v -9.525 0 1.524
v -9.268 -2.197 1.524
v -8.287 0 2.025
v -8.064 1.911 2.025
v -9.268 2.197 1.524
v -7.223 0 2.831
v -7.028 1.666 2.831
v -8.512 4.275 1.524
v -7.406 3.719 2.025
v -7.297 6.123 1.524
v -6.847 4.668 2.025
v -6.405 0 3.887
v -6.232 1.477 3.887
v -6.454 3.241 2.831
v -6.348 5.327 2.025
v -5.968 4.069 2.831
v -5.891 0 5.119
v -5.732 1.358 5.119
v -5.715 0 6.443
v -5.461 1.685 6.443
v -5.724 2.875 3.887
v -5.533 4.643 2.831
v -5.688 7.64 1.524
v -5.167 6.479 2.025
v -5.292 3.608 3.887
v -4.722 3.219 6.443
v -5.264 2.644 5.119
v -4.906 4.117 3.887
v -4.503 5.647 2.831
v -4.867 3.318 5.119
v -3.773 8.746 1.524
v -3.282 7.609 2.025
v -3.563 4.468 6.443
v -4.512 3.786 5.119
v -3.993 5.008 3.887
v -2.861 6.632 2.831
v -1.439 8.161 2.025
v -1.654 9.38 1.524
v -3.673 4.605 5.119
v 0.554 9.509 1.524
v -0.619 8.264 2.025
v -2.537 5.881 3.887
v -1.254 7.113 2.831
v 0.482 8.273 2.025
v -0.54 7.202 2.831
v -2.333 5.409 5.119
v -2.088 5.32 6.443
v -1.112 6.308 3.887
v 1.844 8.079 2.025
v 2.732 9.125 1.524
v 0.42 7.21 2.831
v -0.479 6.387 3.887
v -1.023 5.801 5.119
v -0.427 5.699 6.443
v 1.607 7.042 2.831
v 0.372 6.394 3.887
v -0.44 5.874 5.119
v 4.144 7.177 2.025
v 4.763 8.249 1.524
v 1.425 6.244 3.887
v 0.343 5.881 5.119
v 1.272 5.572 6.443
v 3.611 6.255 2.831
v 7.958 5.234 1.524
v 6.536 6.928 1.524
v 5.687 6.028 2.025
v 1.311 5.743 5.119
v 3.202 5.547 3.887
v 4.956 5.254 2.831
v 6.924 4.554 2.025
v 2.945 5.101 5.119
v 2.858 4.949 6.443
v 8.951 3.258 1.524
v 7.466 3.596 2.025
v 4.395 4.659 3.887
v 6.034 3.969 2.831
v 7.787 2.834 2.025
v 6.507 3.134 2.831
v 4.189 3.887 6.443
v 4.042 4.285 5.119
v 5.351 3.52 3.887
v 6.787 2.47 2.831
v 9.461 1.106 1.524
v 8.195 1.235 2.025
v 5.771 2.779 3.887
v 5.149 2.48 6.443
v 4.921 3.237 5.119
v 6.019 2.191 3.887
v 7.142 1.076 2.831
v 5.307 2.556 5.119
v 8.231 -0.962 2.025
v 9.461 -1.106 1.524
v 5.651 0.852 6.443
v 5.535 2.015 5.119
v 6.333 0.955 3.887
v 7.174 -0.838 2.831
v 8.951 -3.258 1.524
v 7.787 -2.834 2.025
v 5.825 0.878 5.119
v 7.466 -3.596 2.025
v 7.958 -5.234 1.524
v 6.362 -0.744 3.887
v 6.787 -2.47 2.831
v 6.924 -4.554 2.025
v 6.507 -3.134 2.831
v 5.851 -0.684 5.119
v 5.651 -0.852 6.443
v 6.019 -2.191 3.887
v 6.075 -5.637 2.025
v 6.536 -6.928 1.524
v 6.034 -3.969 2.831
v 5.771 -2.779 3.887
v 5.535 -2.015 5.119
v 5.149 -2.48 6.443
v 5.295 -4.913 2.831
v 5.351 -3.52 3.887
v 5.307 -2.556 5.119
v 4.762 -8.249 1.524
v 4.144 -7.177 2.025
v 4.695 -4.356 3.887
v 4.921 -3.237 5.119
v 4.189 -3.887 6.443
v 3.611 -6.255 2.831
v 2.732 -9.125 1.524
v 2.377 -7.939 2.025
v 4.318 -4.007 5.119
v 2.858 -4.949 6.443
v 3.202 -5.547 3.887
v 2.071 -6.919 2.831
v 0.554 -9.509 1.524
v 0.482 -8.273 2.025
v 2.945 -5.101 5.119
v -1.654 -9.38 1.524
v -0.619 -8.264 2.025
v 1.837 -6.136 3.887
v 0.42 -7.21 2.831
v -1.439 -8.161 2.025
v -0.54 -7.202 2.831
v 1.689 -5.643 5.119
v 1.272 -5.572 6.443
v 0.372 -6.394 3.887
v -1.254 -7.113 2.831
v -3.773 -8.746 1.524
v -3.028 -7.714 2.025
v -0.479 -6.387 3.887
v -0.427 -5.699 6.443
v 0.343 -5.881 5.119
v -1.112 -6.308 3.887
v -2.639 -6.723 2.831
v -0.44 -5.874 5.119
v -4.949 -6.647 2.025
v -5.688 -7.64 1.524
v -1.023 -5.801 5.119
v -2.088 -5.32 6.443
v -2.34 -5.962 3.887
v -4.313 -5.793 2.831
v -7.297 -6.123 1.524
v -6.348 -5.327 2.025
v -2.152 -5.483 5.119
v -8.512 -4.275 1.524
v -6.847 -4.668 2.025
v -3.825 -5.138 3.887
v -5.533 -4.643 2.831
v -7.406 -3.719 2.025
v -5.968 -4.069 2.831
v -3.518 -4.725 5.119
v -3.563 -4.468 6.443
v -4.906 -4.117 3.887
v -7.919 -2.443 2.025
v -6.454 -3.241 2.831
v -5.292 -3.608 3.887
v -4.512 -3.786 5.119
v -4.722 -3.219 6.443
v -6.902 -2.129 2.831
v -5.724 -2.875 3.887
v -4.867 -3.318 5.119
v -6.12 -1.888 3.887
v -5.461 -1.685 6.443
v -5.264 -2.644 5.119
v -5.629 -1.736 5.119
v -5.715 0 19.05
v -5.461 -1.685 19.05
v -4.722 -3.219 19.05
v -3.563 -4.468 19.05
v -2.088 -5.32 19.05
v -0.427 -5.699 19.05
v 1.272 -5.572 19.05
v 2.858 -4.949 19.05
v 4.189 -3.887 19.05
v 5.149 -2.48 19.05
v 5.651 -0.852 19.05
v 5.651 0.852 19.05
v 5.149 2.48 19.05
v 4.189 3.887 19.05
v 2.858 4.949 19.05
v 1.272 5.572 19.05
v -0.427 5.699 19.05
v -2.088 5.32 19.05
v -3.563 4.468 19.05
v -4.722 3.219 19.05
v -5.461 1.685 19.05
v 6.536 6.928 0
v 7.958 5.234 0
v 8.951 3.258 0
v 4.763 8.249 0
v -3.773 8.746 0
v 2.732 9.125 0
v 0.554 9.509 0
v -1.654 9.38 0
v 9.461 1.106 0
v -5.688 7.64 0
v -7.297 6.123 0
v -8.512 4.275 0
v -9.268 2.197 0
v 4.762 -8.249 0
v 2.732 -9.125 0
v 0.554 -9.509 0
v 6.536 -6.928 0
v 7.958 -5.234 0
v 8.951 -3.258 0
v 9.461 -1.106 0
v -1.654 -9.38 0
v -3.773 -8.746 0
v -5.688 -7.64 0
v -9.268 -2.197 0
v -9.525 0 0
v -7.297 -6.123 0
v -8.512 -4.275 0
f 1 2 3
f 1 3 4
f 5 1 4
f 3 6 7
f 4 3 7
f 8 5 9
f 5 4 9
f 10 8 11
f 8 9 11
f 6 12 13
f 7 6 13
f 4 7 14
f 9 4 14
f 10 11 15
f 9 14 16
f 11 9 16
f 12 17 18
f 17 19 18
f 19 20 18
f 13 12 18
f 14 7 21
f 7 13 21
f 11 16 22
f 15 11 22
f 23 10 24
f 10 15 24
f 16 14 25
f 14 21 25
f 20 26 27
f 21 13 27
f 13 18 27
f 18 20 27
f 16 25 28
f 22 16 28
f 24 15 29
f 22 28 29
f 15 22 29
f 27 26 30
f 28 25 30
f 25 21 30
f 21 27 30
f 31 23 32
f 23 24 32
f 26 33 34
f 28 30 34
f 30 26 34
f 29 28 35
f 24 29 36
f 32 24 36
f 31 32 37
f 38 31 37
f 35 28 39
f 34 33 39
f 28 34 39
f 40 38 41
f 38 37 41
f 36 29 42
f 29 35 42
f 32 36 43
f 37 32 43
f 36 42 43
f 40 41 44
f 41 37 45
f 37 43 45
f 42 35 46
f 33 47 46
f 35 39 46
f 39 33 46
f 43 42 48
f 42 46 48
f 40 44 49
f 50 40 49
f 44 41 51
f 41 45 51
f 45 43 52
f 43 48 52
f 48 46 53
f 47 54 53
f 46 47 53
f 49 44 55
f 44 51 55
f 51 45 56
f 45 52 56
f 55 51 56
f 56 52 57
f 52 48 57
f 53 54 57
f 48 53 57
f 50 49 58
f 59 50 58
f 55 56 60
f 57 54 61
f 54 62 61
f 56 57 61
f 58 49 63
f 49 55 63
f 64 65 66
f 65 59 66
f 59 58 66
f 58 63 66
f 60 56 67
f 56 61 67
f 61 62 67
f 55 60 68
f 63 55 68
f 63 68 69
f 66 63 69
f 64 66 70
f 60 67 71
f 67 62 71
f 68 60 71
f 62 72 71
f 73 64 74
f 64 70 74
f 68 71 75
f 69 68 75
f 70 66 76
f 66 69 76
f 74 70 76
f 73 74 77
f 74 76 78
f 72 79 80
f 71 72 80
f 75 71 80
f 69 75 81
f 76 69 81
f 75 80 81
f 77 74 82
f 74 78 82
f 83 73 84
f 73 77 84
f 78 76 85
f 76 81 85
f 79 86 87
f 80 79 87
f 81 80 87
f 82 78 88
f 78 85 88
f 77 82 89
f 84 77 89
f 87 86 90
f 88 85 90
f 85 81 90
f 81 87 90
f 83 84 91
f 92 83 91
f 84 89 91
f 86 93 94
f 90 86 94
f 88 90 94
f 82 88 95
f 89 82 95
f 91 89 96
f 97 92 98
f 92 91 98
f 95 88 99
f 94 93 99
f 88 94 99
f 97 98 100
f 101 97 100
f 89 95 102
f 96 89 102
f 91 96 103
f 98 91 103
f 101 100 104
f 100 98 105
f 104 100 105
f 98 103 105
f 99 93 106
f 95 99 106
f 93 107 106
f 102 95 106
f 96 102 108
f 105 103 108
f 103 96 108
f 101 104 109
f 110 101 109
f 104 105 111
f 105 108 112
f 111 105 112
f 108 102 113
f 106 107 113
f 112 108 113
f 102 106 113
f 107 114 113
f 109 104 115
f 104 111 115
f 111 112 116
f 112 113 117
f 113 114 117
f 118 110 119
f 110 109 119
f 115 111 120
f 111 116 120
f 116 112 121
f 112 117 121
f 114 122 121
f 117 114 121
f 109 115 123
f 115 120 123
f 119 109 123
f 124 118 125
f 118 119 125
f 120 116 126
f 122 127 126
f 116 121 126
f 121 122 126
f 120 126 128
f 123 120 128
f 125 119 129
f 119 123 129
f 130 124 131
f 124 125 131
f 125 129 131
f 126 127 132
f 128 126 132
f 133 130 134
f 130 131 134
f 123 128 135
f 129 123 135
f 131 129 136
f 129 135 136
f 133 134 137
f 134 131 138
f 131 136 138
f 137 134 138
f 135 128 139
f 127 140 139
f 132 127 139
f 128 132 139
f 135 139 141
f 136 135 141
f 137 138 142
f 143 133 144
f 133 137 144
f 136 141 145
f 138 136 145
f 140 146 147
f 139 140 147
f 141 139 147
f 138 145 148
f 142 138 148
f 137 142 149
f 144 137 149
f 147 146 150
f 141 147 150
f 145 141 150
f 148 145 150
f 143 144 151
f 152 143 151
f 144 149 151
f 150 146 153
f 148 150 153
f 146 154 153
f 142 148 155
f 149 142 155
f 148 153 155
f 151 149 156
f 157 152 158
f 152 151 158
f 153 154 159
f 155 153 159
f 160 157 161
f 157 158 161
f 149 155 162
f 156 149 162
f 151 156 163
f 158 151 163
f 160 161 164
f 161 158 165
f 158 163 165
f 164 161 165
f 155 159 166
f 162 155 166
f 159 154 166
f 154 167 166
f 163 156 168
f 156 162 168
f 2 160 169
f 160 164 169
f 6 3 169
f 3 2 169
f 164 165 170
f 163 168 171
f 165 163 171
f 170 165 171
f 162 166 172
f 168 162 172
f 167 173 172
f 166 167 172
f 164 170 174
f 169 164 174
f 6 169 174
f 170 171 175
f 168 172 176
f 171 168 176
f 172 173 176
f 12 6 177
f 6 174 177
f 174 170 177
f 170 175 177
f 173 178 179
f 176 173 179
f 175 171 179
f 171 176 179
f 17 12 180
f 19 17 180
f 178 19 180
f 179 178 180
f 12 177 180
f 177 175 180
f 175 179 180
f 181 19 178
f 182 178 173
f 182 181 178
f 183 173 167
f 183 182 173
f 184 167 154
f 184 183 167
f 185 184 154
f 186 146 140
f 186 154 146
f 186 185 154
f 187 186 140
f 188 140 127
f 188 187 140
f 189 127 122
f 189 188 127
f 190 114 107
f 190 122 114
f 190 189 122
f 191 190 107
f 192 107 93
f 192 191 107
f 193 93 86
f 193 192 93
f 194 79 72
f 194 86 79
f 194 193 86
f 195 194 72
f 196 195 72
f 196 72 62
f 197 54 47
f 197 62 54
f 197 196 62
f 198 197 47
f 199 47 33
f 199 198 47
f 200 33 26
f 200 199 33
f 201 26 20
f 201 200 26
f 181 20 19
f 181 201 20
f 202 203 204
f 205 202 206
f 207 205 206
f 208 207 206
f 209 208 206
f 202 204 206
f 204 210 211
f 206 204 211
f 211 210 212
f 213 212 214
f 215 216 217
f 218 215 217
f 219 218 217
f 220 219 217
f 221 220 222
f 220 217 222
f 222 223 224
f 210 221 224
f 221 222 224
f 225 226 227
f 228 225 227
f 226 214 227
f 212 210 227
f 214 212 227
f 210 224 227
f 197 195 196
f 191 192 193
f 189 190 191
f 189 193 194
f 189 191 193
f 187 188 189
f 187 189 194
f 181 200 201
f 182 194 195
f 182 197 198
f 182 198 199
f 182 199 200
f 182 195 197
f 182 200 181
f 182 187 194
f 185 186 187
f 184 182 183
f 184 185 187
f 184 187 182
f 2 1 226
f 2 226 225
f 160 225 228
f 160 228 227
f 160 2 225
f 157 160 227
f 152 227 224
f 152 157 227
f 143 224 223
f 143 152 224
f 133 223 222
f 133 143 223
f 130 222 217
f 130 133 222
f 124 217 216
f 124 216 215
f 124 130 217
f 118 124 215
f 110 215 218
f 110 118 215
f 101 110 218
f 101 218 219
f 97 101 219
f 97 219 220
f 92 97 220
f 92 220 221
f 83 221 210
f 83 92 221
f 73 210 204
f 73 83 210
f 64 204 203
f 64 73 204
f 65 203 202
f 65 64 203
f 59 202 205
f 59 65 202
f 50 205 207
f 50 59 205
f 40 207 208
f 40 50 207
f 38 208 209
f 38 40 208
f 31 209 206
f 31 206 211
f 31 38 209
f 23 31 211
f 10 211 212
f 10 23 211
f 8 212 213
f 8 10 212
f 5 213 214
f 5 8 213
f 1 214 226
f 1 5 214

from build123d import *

# Parameters (mm, degrees)
F0_W = 9.525
F0_H = 1.524
F2_W = 5.715
F2_H = 19.05


# Not quite as in the source:
# - a fillet or chamfer that OpenCascade refuses, or shapes differently, is made with other operations: its cross-section is extruded or revolved along the edge and cut away or added


with BuildPart() as f1:
    # F0 (on Front) → F1 (revolve)
    with BuildSketch(Plane.XZ):
        with Locations((-4.7625, 0.762)):
            Rectangle(F0_W, F0_H)
    revolve(axis=Axis((0, 0, 0.762), (0, 0, 1)))

    # F2 (on Front) → F3 (revolve)
    with BuildSketch(Plane.XZ):
        with Locations((-2.8575, 9.525)):
            Rectangle(F2_W, F2_H)
    revolve(axis=Axis((0, 0, 9.525), (0, 0, 1)))

    # F4: fillet of radius 5.08 on 1 edges, made by hand

    # F4_s1 → F4_t2 (revolve)
    with BuildSketch(Plane.XZ):
        with BuildLine():
            ThreePointArc((-9.525, 1.524), (-6.7789073716, 3.3318368763), (-5.715, 6.4426888497))
            Line((-5.715, 6.4426888497), (-5.6134, 6.4426888497))
            Line((-5.6134, 6.4426888497), (-5.6134, 1.524))
            Line((-5.6134, 1.524), (-5.715, 1.4224))
            ThreePointArc((-5.715, 1.4224), (-7.62, 1.4224), (-9.4996, 1.425626223))
            Line((-9.4996, 1.425626223), (-9.525, 1.524))
        make_face()
    revolve(axis=Axis((0, 0, 1.524), (0, 0, -1)))


solid = f1.part
